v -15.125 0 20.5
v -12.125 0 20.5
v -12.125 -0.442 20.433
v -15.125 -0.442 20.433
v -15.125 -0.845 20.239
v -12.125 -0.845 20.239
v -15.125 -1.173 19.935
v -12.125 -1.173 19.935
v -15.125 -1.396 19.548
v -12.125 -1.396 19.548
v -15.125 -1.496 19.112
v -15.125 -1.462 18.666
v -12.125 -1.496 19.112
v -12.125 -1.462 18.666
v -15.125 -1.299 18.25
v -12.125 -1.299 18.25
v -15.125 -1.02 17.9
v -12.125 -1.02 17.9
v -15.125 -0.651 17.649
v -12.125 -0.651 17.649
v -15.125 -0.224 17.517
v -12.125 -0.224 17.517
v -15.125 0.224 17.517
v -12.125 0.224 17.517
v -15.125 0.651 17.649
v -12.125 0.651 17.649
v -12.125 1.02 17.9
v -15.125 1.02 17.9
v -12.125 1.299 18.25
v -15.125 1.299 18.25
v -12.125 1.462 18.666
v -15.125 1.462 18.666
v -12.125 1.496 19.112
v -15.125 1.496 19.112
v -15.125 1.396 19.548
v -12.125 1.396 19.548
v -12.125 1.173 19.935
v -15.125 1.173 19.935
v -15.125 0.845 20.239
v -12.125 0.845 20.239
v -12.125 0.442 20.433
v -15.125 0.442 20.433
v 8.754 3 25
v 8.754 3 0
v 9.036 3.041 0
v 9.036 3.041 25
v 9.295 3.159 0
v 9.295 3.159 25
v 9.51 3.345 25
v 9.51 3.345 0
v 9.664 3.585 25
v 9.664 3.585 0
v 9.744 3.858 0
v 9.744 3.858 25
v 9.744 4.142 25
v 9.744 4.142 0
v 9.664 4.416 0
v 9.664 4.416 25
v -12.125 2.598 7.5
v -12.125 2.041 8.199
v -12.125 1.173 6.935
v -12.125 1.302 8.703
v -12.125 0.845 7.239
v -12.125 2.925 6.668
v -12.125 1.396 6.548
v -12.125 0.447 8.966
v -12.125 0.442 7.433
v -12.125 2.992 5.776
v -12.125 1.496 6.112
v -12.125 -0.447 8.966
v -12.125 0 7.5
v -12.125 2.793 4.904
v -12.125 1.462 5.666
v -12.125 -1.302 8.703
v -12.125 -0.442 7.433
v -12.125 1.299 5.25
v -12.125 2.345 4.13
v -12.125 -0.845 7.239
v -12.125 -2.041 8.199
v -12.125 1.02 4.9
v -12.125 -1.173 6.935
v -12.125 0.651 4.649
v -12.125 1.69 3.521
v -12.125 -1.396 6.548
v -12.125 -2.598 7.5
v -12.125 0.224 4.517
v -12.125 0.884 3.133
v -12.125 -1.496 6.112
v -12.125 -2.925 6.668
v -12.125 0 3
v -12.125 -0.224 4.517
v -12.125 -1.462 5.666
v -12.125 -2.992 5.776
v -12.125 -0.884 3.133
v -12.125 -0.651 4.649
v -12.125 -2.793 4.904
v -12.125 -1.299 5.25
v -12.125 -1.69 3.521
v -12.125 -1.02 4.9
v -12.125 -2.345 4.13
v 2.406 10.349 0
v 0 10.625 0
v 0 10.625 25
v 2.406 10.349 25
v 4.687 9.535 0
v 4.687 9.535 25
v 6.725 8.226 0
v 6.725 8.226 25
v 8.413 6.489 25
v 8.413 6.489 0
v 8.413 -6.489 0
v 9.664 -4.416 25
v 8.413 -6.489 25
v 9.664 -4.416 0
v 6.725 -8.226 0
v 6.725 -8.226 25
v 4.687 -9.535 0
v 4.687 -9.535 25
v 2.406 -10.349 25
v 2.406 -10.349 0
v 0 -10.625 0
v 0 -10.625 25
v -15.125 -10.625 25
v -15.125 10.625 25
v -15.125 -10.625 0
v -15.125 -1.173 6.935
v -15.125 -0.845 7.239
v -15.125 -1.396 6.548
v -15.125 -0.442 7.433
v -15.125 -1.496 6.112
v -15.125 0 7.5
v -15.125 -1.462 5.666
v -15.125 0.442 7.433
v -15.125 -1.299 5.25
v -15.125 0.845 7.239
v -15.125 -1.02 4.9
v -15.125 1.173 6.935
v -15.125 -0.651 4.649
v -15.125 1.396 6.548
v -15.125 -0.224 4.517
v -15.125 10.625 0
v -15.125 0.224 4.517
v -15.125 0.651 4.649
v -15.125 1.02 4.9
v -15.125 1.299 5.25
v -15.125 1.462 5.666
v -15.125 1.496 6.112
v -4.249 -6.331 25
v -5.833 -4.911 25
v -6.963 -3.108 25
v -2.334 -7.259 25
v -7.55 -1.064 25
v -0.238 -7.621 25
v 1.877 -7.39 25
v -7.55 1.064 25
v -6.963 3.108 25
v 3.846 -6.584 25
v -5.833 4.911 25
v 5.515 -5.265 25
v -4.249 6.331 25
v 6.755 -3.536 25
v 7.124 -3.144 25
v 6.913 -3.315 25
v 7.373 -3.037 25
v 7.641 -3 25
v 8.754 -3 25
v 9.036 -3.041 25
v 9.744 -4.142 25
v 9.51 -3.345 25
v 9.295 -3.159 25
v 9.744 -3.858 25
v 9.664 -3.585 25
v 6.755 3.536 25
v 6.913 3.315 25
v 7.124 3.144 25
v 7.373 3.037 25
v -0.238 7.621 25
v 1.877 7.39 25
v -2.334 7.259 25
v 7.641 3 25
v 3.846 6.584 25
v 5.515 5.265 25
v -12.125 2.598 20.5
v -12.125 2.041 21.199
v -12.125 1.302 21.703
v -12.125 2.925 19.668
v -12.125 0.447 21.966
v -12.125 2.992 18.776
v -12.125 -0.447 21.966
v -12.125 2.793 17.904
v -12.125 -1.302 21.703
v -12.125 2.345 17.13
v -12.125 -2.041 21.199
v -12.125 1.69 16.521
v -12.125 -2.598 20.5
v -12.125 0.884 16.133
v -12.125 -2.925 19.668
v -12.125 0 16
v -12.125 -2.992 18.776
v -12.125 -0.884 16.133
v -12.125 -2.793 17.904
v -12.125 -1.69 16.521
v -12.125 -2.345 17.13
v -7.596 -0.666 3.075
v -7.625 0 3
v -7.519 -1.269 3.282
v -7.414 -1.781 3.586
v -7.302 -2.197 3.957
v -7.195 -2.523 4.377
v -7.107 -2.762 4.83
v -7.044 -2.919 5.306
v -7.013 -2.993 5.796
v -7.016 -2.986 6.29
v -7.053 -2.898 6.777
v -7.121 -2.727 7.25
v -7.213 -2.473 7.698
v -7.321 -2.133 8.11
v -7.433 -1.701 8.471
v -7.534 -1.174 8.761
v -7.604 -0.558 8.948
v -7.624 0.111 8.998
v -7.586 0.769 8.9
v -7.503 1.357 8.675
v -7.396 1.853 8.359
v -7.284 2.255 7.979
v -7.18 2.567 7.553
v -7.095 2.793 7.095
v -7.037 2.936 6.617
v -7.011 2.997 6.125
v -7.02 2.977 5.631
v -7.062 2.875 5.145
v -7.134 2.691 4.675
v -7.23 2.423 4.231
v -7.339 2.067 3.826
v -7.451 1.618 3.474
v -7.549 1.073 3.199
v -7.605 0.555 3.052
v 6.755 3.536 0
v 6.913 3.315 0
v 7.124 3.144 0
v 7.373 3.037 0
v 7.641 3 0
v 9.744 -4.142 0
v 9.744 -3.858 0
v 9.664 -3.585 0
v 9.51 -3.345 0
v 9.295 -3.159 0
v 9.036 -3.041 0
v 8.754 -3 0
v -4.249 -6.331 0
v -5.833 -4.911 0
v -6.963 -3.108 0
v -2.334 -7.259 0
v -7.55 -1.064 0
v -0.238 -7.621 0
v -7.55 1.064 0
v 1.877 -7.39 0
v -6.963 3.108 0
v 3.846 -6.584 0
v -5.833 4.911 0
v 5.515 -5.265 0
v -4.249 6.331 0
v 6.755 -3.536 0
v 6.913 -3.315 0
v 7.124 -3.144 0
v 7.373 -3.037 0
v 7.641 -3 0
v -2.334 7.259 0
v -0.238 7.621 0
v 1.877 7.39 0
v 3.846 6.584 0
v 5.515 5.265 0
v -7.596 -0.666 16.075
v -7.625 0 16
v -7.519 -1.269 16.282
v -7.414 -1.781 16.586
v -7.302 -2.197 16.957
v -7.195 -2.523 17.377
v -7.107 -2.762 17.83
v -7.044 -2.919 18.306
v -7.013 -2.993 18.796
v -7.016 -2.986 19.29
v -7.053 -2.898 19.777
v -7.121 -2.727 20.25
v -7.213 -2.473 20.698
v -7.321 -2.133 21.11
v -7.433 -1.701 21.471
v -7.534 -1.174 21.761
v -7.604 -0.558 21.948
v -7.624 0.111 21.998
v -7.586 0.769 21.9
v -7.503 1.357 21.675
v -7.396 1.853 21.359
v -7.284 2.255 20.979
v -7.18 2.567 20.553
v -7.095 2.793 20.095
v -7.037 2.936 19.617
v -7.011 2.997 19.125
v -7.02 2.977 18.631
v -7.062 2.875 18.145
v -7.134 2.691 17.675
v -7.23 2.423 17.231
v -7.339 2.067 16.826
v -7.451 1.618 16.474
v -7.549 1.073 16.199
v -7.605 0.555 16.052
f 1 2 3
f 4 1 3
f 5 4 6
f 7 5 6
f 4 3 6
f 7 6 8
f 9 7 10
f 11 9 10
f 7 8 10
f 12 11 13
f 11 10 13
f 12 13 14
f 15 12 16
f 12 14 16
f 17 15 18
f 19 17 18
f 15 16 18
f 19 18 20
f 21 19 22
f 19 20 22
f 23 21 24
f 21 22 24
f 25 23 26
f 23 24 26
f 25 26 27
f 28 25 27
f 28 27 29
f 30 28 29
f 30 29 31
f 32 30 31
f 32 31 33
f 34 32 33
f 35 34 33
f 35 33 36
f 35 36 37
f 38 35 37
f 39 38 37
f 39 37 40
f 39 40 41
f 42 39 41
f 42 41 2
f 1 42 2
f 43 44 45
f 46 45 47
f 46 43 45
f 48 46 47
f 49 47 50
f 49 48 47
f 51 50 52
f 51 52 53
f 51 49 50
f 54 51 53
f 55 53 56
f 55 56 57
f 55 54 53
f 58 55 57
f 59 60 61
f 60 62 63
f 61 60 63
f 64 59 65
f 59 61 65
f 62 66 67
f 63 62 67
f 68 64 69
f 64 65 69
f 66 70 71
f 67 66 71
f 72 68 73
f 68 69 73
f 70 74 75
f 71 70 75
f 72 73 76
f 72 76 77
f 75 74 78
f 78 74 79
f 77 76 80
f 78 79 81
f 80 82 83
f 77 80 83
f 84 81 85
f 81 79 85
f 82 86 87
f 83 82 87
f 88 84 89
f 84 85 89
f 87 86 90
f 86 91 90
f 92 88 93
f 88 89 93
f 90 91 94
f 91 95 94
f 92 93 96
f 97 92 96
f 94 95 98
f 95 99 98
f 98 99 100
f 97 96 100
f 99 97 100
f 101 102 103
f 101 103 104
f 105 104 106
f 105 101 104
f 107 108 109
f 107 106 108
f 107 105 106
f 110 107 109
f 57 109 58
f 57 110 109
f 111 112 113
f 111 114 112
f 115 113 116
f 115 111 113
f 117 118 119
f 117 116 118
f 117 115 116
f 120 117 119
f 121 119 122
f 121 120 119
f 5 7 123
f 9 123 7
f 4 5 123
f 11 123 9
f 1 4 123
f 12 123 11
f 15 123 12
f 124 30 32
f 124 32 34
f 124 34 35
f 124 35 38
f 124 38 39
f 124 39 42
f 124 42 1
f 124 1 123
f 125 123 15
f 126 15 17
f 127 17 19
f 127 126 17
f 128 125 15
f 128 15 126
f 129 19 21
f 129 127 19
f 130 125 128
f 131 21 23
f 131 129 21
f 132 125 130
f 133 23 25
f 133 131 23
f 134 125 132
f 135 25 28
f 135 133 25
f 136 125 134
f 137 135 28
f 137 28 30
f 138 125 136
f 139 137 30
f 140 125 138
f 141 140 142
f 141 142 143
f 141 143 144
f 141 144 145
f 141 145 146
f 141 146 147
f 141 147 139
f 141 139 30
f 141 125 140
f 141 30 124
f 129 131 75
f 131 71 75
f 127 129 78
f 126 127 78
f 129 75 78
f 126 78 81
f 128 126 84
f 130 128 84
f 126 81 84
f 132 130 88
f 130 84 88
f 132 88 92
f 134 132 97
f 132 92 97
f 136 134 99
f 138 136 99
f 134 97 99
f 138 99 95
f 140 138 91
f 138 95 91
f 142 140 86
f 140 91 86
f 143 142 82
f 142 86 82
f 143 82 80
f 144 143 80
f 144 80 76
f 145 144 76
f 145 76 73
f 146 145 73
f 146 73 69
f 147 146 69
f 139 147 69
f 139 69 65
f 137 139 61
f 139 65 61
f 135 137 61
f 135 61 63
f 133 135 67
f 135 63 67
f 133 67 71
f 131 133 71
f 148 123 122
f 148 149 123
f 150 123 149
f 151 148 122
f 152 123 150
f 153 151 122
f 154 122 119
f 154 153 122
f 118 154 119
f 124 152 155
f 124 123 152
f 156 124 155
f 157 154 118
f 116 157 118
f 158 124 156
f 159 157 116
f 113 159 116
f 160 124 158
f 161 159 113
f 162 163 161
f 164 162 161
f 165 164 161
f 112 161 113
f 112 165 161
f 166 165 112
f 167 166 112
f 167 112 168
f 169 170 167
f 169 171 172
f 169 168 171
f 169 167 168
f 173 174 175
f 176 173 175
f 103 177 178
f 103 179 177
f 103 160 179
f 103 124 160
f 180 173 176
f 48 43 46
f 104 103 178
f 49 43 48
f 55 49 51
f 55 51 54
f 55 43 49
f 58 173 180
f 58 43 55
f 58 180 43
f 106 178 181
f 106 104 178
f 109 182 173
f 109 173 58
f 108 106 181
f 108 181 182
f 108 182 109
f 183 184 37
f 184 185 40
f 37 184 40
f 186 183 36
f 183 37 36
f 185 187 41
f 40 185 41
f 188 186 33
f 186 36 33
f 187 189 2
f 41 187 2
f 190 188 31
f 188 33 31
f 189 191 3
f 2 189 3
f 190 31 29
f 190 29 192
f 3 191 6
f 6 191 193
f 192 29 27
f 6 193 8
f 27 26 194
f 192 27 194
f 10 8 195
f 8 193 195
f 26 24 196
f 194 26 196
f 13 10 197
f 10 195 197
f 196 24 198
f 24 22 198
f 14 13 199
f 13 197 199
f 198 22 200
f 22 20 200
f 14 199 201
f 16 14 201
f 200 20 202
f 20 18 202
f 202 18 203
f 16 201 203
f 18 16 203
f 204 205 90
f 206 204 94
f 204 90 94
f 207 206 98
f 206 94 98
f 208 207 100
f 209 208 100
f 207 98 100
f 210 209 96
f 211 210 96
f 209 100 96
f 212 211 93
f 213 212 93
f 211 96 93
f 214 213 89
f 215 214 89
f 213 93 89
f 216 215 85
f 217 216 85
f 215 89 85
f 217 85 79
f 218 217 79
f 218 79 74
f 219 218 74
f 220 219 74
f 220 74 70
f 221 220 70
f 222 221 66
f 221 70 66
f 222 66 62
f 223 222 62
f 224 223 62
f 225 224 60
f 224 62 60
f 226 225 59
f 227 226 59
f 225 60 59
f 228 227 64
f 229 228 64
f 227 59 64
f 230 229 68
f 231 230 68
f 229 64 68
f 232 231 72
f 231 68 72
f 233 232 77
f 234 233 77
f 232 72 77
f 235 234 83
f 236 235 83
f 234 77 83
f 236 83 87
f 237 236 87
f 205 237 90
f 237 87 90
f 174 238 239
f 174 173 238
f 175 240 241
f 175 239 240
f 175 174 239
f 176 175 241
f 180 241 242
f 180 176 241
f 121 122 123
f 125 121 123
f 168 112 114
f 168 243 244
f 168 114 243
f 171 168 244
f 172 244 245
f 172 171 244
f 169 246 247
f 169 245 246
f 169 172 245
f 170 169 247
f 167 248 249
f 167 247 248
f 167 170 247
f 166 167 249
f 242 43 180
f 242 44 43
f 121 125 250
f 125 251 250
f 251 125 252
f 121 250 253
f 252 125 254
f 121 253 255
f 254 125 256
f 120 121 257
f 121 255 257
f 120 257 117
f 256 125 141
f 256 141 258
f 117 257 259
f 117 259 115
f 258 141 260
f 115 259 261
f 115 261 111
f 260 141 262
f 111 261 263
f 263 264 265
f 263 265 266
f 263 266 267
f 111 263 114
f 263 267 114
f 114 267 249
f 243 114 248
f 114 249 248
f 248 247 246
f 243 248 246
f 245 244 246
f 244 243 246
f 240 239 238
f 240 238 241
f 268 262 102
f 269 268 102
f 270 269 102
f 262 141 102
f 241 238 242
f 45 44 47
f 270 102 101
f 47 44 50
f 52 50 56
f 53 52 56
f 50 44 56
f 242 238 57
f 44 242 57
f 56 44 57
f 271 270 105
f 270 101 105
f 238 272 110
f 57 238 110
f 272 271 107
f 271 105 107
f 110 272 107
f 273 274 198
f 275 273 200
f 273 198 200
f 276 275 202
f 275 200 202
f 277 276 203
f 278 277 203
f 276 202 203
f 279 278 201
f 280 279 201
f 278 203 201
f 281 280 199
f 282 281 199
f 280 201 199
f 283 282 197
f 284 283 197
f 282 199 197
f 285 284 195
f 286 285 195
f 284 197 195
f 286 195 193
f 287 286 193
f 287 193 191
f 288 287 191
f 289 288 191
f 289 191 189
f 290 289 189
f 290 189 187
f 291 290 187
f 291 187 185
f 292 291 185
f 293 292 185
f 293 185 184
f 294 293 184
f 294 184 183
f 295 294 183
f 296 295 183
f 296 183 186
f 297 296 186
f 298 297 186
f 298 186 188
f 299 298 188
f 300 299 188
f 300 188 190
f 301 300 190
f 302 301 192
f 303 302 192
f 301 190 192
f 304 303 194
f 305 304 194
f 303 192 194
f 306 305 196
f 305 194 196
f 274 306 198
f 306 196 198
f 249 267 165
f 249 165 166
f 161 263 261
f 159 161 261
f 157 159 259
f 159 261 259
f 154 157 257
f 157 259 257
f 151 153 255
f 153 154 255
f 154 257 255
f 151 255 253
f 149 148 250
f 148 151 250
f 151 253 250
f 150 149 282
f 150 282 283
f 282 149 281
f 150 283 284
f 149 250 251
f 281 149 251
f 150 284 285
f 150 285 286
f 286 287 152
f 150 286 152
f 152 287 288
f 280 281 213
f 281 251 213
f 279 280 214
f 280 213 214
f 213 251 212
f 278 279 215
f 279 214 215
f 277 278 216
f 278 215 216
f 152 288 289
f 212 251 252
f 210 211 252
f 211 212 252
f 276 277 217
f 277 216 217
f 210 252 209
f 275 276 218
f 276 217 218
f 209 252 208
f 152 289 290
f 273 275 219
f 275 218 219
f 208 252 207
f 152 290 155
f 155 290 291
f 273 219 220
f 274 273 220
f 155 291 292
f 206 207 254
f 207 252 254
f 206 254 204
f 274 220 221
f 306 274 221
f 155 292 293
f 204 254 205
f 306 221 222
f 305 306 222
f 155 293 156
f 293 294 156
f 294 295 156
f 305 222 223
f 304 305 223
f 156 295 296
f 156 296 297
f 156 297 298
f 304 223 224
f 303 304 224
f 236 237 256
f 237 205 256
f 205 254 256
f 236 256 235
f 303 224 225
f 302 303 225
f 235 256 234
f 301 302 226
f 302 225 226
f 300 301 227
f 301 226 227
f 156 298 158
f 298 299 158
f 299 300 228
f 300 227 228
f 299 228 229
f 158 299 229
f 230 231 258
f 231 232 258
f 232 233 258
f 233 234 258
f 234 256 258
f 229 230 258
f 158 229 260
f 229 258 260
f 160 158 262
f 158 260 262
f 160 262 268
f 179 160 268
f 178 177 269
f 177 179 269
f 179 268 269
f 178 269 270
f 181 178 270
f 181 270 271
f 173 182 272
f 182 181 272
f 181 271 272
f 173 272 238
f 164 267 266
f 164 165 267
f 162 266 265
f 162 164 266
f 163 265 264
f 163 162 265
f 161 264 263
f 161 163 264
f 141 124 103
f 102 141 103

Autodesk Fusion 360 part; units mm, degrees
sketch "Sketch1" plane through (0, 0, 0) normal (0, 0, 1) x (1, 0, 0)
  line L0 (17.5, 3) -> (-7.01, 3)
  line L1 (17.5, -3) -> (17.5, 3)
  arc A0 (7.01, 3) -> (7.01, -3) centre (0, 0) ccw
  arc A1 (10.1927, 3) -> (10.1927, -3) centre (0, 0) ccw
  line L2 (-7.01, -3) -> (17.5, -3)
  dimension "d1" = 15.25
extrude "Extrude1" add sketch "Sketch1" along normal blind 25 contours L0 A0 A1 L2 makes body 1
sketch "Sketch3" plane through (0, 0, 0) normal (0, 0, 1) x (1, 0, 0)
  arc A0 (7.01, 3) -> (7.01, -3) centre (0, 0) ccw construction
  line L0 (0, -10.625) -> (-15.125, -10.625)
  line L1 (-15.125, -10.625) -> (-15.125, 10.625)
  line L2 (-15.125, 10.625) -> (0, 10.625)
  arc A1 (10.1927, 3) -> (10.1927, -3) centre (0, 0) ccw
  line L3 (0, 10.625) -> (0, 7.625)
  line L4 (0, -7.625) -> (0, -10.625)
extrude "Extrude2" add sketch "Sketch3" along normal blind 25 bodies 1
ref_plane "WorkPlane1" through (-12.125, 0, 12.5) normal (-1, 0, 0) x (0, -1, 0)
sketch "Sketch4" plane through (-15.125, 0, 0) normal (-1, 0, 0) x (0, -1, 0)
  line L0 (-10.625, 0) -> (10.625, 0)
  line L1 (10.625, 0) -> (10.625, 25)
  line L2 (10.625, 25) -> (-10.625, 25)
  line L3 (-10.625, 25) -> (-10.625, 0)
  line L4 (0, 25) -> (0, 19) construction
  line L5 (0, 0) -> (0, 6) construction
  dimension "d11" = 6
  dimension "d12" = 6
hole "Hole1" at (-15.125, 0, 19) direction (1, 0, 0) diameter 3 end through all bodies 1
hole "Hole2" at (-15.125, 0, 6) direction (1, 0, 0) diameter 3 depth 24.216 tip angle 180 bodies 1
ref_plane "WorkPlane2" through (-5.125, 0, 12.5) normal (-1, 0, 0) x (0, -1, 0)
sketch "Sketch5" plane through (-5.125, 0, 12.5) normal (-1, 0, 0) x (0, 1, 0)
  line L0 (7.625, -12.5) -> (-7.625, -12.5) construction
  line L1 (0, -12.5) -> (0, -6.5) construction
  line L2 (-10.625, 12.5) -> (10.625, 12.5) construction
  line L3 (0, 12.5) -> (0, 6.5) construction
  point P0 (0, -12.5)
  point P1 (0, 12.5)
  dimension "d20" = 6
  dimension "d21" = 6
hole "Hole3" at (-5.125, 0, 19) direction (-1, 0, 0) diameter 6 end up to surface (7 mm away) bodies 1
hole "Hole4" at (-5.125, 0, 6) direction (-1, 0, 0) diameter 6 end up to surface (7 mm away) bodies 1
fillet "Fillet1" radius 1 4 edges at (10.1927, -3, 12.5) (7.01, -3, 12.5) (10.1927, 3, 12.5) (7.01, 3, 12.5) on bodies 1
copy_body "Body->Comp1" bodies 1 removing the originals makes body 2 in component "Mountable Linear Bearing Holder"
component "Mountable Linear Bearing Holder" placed x (1, 0, 0) y (0, 1, 0) z (0, 0, 1) at (0, 0, 0)
